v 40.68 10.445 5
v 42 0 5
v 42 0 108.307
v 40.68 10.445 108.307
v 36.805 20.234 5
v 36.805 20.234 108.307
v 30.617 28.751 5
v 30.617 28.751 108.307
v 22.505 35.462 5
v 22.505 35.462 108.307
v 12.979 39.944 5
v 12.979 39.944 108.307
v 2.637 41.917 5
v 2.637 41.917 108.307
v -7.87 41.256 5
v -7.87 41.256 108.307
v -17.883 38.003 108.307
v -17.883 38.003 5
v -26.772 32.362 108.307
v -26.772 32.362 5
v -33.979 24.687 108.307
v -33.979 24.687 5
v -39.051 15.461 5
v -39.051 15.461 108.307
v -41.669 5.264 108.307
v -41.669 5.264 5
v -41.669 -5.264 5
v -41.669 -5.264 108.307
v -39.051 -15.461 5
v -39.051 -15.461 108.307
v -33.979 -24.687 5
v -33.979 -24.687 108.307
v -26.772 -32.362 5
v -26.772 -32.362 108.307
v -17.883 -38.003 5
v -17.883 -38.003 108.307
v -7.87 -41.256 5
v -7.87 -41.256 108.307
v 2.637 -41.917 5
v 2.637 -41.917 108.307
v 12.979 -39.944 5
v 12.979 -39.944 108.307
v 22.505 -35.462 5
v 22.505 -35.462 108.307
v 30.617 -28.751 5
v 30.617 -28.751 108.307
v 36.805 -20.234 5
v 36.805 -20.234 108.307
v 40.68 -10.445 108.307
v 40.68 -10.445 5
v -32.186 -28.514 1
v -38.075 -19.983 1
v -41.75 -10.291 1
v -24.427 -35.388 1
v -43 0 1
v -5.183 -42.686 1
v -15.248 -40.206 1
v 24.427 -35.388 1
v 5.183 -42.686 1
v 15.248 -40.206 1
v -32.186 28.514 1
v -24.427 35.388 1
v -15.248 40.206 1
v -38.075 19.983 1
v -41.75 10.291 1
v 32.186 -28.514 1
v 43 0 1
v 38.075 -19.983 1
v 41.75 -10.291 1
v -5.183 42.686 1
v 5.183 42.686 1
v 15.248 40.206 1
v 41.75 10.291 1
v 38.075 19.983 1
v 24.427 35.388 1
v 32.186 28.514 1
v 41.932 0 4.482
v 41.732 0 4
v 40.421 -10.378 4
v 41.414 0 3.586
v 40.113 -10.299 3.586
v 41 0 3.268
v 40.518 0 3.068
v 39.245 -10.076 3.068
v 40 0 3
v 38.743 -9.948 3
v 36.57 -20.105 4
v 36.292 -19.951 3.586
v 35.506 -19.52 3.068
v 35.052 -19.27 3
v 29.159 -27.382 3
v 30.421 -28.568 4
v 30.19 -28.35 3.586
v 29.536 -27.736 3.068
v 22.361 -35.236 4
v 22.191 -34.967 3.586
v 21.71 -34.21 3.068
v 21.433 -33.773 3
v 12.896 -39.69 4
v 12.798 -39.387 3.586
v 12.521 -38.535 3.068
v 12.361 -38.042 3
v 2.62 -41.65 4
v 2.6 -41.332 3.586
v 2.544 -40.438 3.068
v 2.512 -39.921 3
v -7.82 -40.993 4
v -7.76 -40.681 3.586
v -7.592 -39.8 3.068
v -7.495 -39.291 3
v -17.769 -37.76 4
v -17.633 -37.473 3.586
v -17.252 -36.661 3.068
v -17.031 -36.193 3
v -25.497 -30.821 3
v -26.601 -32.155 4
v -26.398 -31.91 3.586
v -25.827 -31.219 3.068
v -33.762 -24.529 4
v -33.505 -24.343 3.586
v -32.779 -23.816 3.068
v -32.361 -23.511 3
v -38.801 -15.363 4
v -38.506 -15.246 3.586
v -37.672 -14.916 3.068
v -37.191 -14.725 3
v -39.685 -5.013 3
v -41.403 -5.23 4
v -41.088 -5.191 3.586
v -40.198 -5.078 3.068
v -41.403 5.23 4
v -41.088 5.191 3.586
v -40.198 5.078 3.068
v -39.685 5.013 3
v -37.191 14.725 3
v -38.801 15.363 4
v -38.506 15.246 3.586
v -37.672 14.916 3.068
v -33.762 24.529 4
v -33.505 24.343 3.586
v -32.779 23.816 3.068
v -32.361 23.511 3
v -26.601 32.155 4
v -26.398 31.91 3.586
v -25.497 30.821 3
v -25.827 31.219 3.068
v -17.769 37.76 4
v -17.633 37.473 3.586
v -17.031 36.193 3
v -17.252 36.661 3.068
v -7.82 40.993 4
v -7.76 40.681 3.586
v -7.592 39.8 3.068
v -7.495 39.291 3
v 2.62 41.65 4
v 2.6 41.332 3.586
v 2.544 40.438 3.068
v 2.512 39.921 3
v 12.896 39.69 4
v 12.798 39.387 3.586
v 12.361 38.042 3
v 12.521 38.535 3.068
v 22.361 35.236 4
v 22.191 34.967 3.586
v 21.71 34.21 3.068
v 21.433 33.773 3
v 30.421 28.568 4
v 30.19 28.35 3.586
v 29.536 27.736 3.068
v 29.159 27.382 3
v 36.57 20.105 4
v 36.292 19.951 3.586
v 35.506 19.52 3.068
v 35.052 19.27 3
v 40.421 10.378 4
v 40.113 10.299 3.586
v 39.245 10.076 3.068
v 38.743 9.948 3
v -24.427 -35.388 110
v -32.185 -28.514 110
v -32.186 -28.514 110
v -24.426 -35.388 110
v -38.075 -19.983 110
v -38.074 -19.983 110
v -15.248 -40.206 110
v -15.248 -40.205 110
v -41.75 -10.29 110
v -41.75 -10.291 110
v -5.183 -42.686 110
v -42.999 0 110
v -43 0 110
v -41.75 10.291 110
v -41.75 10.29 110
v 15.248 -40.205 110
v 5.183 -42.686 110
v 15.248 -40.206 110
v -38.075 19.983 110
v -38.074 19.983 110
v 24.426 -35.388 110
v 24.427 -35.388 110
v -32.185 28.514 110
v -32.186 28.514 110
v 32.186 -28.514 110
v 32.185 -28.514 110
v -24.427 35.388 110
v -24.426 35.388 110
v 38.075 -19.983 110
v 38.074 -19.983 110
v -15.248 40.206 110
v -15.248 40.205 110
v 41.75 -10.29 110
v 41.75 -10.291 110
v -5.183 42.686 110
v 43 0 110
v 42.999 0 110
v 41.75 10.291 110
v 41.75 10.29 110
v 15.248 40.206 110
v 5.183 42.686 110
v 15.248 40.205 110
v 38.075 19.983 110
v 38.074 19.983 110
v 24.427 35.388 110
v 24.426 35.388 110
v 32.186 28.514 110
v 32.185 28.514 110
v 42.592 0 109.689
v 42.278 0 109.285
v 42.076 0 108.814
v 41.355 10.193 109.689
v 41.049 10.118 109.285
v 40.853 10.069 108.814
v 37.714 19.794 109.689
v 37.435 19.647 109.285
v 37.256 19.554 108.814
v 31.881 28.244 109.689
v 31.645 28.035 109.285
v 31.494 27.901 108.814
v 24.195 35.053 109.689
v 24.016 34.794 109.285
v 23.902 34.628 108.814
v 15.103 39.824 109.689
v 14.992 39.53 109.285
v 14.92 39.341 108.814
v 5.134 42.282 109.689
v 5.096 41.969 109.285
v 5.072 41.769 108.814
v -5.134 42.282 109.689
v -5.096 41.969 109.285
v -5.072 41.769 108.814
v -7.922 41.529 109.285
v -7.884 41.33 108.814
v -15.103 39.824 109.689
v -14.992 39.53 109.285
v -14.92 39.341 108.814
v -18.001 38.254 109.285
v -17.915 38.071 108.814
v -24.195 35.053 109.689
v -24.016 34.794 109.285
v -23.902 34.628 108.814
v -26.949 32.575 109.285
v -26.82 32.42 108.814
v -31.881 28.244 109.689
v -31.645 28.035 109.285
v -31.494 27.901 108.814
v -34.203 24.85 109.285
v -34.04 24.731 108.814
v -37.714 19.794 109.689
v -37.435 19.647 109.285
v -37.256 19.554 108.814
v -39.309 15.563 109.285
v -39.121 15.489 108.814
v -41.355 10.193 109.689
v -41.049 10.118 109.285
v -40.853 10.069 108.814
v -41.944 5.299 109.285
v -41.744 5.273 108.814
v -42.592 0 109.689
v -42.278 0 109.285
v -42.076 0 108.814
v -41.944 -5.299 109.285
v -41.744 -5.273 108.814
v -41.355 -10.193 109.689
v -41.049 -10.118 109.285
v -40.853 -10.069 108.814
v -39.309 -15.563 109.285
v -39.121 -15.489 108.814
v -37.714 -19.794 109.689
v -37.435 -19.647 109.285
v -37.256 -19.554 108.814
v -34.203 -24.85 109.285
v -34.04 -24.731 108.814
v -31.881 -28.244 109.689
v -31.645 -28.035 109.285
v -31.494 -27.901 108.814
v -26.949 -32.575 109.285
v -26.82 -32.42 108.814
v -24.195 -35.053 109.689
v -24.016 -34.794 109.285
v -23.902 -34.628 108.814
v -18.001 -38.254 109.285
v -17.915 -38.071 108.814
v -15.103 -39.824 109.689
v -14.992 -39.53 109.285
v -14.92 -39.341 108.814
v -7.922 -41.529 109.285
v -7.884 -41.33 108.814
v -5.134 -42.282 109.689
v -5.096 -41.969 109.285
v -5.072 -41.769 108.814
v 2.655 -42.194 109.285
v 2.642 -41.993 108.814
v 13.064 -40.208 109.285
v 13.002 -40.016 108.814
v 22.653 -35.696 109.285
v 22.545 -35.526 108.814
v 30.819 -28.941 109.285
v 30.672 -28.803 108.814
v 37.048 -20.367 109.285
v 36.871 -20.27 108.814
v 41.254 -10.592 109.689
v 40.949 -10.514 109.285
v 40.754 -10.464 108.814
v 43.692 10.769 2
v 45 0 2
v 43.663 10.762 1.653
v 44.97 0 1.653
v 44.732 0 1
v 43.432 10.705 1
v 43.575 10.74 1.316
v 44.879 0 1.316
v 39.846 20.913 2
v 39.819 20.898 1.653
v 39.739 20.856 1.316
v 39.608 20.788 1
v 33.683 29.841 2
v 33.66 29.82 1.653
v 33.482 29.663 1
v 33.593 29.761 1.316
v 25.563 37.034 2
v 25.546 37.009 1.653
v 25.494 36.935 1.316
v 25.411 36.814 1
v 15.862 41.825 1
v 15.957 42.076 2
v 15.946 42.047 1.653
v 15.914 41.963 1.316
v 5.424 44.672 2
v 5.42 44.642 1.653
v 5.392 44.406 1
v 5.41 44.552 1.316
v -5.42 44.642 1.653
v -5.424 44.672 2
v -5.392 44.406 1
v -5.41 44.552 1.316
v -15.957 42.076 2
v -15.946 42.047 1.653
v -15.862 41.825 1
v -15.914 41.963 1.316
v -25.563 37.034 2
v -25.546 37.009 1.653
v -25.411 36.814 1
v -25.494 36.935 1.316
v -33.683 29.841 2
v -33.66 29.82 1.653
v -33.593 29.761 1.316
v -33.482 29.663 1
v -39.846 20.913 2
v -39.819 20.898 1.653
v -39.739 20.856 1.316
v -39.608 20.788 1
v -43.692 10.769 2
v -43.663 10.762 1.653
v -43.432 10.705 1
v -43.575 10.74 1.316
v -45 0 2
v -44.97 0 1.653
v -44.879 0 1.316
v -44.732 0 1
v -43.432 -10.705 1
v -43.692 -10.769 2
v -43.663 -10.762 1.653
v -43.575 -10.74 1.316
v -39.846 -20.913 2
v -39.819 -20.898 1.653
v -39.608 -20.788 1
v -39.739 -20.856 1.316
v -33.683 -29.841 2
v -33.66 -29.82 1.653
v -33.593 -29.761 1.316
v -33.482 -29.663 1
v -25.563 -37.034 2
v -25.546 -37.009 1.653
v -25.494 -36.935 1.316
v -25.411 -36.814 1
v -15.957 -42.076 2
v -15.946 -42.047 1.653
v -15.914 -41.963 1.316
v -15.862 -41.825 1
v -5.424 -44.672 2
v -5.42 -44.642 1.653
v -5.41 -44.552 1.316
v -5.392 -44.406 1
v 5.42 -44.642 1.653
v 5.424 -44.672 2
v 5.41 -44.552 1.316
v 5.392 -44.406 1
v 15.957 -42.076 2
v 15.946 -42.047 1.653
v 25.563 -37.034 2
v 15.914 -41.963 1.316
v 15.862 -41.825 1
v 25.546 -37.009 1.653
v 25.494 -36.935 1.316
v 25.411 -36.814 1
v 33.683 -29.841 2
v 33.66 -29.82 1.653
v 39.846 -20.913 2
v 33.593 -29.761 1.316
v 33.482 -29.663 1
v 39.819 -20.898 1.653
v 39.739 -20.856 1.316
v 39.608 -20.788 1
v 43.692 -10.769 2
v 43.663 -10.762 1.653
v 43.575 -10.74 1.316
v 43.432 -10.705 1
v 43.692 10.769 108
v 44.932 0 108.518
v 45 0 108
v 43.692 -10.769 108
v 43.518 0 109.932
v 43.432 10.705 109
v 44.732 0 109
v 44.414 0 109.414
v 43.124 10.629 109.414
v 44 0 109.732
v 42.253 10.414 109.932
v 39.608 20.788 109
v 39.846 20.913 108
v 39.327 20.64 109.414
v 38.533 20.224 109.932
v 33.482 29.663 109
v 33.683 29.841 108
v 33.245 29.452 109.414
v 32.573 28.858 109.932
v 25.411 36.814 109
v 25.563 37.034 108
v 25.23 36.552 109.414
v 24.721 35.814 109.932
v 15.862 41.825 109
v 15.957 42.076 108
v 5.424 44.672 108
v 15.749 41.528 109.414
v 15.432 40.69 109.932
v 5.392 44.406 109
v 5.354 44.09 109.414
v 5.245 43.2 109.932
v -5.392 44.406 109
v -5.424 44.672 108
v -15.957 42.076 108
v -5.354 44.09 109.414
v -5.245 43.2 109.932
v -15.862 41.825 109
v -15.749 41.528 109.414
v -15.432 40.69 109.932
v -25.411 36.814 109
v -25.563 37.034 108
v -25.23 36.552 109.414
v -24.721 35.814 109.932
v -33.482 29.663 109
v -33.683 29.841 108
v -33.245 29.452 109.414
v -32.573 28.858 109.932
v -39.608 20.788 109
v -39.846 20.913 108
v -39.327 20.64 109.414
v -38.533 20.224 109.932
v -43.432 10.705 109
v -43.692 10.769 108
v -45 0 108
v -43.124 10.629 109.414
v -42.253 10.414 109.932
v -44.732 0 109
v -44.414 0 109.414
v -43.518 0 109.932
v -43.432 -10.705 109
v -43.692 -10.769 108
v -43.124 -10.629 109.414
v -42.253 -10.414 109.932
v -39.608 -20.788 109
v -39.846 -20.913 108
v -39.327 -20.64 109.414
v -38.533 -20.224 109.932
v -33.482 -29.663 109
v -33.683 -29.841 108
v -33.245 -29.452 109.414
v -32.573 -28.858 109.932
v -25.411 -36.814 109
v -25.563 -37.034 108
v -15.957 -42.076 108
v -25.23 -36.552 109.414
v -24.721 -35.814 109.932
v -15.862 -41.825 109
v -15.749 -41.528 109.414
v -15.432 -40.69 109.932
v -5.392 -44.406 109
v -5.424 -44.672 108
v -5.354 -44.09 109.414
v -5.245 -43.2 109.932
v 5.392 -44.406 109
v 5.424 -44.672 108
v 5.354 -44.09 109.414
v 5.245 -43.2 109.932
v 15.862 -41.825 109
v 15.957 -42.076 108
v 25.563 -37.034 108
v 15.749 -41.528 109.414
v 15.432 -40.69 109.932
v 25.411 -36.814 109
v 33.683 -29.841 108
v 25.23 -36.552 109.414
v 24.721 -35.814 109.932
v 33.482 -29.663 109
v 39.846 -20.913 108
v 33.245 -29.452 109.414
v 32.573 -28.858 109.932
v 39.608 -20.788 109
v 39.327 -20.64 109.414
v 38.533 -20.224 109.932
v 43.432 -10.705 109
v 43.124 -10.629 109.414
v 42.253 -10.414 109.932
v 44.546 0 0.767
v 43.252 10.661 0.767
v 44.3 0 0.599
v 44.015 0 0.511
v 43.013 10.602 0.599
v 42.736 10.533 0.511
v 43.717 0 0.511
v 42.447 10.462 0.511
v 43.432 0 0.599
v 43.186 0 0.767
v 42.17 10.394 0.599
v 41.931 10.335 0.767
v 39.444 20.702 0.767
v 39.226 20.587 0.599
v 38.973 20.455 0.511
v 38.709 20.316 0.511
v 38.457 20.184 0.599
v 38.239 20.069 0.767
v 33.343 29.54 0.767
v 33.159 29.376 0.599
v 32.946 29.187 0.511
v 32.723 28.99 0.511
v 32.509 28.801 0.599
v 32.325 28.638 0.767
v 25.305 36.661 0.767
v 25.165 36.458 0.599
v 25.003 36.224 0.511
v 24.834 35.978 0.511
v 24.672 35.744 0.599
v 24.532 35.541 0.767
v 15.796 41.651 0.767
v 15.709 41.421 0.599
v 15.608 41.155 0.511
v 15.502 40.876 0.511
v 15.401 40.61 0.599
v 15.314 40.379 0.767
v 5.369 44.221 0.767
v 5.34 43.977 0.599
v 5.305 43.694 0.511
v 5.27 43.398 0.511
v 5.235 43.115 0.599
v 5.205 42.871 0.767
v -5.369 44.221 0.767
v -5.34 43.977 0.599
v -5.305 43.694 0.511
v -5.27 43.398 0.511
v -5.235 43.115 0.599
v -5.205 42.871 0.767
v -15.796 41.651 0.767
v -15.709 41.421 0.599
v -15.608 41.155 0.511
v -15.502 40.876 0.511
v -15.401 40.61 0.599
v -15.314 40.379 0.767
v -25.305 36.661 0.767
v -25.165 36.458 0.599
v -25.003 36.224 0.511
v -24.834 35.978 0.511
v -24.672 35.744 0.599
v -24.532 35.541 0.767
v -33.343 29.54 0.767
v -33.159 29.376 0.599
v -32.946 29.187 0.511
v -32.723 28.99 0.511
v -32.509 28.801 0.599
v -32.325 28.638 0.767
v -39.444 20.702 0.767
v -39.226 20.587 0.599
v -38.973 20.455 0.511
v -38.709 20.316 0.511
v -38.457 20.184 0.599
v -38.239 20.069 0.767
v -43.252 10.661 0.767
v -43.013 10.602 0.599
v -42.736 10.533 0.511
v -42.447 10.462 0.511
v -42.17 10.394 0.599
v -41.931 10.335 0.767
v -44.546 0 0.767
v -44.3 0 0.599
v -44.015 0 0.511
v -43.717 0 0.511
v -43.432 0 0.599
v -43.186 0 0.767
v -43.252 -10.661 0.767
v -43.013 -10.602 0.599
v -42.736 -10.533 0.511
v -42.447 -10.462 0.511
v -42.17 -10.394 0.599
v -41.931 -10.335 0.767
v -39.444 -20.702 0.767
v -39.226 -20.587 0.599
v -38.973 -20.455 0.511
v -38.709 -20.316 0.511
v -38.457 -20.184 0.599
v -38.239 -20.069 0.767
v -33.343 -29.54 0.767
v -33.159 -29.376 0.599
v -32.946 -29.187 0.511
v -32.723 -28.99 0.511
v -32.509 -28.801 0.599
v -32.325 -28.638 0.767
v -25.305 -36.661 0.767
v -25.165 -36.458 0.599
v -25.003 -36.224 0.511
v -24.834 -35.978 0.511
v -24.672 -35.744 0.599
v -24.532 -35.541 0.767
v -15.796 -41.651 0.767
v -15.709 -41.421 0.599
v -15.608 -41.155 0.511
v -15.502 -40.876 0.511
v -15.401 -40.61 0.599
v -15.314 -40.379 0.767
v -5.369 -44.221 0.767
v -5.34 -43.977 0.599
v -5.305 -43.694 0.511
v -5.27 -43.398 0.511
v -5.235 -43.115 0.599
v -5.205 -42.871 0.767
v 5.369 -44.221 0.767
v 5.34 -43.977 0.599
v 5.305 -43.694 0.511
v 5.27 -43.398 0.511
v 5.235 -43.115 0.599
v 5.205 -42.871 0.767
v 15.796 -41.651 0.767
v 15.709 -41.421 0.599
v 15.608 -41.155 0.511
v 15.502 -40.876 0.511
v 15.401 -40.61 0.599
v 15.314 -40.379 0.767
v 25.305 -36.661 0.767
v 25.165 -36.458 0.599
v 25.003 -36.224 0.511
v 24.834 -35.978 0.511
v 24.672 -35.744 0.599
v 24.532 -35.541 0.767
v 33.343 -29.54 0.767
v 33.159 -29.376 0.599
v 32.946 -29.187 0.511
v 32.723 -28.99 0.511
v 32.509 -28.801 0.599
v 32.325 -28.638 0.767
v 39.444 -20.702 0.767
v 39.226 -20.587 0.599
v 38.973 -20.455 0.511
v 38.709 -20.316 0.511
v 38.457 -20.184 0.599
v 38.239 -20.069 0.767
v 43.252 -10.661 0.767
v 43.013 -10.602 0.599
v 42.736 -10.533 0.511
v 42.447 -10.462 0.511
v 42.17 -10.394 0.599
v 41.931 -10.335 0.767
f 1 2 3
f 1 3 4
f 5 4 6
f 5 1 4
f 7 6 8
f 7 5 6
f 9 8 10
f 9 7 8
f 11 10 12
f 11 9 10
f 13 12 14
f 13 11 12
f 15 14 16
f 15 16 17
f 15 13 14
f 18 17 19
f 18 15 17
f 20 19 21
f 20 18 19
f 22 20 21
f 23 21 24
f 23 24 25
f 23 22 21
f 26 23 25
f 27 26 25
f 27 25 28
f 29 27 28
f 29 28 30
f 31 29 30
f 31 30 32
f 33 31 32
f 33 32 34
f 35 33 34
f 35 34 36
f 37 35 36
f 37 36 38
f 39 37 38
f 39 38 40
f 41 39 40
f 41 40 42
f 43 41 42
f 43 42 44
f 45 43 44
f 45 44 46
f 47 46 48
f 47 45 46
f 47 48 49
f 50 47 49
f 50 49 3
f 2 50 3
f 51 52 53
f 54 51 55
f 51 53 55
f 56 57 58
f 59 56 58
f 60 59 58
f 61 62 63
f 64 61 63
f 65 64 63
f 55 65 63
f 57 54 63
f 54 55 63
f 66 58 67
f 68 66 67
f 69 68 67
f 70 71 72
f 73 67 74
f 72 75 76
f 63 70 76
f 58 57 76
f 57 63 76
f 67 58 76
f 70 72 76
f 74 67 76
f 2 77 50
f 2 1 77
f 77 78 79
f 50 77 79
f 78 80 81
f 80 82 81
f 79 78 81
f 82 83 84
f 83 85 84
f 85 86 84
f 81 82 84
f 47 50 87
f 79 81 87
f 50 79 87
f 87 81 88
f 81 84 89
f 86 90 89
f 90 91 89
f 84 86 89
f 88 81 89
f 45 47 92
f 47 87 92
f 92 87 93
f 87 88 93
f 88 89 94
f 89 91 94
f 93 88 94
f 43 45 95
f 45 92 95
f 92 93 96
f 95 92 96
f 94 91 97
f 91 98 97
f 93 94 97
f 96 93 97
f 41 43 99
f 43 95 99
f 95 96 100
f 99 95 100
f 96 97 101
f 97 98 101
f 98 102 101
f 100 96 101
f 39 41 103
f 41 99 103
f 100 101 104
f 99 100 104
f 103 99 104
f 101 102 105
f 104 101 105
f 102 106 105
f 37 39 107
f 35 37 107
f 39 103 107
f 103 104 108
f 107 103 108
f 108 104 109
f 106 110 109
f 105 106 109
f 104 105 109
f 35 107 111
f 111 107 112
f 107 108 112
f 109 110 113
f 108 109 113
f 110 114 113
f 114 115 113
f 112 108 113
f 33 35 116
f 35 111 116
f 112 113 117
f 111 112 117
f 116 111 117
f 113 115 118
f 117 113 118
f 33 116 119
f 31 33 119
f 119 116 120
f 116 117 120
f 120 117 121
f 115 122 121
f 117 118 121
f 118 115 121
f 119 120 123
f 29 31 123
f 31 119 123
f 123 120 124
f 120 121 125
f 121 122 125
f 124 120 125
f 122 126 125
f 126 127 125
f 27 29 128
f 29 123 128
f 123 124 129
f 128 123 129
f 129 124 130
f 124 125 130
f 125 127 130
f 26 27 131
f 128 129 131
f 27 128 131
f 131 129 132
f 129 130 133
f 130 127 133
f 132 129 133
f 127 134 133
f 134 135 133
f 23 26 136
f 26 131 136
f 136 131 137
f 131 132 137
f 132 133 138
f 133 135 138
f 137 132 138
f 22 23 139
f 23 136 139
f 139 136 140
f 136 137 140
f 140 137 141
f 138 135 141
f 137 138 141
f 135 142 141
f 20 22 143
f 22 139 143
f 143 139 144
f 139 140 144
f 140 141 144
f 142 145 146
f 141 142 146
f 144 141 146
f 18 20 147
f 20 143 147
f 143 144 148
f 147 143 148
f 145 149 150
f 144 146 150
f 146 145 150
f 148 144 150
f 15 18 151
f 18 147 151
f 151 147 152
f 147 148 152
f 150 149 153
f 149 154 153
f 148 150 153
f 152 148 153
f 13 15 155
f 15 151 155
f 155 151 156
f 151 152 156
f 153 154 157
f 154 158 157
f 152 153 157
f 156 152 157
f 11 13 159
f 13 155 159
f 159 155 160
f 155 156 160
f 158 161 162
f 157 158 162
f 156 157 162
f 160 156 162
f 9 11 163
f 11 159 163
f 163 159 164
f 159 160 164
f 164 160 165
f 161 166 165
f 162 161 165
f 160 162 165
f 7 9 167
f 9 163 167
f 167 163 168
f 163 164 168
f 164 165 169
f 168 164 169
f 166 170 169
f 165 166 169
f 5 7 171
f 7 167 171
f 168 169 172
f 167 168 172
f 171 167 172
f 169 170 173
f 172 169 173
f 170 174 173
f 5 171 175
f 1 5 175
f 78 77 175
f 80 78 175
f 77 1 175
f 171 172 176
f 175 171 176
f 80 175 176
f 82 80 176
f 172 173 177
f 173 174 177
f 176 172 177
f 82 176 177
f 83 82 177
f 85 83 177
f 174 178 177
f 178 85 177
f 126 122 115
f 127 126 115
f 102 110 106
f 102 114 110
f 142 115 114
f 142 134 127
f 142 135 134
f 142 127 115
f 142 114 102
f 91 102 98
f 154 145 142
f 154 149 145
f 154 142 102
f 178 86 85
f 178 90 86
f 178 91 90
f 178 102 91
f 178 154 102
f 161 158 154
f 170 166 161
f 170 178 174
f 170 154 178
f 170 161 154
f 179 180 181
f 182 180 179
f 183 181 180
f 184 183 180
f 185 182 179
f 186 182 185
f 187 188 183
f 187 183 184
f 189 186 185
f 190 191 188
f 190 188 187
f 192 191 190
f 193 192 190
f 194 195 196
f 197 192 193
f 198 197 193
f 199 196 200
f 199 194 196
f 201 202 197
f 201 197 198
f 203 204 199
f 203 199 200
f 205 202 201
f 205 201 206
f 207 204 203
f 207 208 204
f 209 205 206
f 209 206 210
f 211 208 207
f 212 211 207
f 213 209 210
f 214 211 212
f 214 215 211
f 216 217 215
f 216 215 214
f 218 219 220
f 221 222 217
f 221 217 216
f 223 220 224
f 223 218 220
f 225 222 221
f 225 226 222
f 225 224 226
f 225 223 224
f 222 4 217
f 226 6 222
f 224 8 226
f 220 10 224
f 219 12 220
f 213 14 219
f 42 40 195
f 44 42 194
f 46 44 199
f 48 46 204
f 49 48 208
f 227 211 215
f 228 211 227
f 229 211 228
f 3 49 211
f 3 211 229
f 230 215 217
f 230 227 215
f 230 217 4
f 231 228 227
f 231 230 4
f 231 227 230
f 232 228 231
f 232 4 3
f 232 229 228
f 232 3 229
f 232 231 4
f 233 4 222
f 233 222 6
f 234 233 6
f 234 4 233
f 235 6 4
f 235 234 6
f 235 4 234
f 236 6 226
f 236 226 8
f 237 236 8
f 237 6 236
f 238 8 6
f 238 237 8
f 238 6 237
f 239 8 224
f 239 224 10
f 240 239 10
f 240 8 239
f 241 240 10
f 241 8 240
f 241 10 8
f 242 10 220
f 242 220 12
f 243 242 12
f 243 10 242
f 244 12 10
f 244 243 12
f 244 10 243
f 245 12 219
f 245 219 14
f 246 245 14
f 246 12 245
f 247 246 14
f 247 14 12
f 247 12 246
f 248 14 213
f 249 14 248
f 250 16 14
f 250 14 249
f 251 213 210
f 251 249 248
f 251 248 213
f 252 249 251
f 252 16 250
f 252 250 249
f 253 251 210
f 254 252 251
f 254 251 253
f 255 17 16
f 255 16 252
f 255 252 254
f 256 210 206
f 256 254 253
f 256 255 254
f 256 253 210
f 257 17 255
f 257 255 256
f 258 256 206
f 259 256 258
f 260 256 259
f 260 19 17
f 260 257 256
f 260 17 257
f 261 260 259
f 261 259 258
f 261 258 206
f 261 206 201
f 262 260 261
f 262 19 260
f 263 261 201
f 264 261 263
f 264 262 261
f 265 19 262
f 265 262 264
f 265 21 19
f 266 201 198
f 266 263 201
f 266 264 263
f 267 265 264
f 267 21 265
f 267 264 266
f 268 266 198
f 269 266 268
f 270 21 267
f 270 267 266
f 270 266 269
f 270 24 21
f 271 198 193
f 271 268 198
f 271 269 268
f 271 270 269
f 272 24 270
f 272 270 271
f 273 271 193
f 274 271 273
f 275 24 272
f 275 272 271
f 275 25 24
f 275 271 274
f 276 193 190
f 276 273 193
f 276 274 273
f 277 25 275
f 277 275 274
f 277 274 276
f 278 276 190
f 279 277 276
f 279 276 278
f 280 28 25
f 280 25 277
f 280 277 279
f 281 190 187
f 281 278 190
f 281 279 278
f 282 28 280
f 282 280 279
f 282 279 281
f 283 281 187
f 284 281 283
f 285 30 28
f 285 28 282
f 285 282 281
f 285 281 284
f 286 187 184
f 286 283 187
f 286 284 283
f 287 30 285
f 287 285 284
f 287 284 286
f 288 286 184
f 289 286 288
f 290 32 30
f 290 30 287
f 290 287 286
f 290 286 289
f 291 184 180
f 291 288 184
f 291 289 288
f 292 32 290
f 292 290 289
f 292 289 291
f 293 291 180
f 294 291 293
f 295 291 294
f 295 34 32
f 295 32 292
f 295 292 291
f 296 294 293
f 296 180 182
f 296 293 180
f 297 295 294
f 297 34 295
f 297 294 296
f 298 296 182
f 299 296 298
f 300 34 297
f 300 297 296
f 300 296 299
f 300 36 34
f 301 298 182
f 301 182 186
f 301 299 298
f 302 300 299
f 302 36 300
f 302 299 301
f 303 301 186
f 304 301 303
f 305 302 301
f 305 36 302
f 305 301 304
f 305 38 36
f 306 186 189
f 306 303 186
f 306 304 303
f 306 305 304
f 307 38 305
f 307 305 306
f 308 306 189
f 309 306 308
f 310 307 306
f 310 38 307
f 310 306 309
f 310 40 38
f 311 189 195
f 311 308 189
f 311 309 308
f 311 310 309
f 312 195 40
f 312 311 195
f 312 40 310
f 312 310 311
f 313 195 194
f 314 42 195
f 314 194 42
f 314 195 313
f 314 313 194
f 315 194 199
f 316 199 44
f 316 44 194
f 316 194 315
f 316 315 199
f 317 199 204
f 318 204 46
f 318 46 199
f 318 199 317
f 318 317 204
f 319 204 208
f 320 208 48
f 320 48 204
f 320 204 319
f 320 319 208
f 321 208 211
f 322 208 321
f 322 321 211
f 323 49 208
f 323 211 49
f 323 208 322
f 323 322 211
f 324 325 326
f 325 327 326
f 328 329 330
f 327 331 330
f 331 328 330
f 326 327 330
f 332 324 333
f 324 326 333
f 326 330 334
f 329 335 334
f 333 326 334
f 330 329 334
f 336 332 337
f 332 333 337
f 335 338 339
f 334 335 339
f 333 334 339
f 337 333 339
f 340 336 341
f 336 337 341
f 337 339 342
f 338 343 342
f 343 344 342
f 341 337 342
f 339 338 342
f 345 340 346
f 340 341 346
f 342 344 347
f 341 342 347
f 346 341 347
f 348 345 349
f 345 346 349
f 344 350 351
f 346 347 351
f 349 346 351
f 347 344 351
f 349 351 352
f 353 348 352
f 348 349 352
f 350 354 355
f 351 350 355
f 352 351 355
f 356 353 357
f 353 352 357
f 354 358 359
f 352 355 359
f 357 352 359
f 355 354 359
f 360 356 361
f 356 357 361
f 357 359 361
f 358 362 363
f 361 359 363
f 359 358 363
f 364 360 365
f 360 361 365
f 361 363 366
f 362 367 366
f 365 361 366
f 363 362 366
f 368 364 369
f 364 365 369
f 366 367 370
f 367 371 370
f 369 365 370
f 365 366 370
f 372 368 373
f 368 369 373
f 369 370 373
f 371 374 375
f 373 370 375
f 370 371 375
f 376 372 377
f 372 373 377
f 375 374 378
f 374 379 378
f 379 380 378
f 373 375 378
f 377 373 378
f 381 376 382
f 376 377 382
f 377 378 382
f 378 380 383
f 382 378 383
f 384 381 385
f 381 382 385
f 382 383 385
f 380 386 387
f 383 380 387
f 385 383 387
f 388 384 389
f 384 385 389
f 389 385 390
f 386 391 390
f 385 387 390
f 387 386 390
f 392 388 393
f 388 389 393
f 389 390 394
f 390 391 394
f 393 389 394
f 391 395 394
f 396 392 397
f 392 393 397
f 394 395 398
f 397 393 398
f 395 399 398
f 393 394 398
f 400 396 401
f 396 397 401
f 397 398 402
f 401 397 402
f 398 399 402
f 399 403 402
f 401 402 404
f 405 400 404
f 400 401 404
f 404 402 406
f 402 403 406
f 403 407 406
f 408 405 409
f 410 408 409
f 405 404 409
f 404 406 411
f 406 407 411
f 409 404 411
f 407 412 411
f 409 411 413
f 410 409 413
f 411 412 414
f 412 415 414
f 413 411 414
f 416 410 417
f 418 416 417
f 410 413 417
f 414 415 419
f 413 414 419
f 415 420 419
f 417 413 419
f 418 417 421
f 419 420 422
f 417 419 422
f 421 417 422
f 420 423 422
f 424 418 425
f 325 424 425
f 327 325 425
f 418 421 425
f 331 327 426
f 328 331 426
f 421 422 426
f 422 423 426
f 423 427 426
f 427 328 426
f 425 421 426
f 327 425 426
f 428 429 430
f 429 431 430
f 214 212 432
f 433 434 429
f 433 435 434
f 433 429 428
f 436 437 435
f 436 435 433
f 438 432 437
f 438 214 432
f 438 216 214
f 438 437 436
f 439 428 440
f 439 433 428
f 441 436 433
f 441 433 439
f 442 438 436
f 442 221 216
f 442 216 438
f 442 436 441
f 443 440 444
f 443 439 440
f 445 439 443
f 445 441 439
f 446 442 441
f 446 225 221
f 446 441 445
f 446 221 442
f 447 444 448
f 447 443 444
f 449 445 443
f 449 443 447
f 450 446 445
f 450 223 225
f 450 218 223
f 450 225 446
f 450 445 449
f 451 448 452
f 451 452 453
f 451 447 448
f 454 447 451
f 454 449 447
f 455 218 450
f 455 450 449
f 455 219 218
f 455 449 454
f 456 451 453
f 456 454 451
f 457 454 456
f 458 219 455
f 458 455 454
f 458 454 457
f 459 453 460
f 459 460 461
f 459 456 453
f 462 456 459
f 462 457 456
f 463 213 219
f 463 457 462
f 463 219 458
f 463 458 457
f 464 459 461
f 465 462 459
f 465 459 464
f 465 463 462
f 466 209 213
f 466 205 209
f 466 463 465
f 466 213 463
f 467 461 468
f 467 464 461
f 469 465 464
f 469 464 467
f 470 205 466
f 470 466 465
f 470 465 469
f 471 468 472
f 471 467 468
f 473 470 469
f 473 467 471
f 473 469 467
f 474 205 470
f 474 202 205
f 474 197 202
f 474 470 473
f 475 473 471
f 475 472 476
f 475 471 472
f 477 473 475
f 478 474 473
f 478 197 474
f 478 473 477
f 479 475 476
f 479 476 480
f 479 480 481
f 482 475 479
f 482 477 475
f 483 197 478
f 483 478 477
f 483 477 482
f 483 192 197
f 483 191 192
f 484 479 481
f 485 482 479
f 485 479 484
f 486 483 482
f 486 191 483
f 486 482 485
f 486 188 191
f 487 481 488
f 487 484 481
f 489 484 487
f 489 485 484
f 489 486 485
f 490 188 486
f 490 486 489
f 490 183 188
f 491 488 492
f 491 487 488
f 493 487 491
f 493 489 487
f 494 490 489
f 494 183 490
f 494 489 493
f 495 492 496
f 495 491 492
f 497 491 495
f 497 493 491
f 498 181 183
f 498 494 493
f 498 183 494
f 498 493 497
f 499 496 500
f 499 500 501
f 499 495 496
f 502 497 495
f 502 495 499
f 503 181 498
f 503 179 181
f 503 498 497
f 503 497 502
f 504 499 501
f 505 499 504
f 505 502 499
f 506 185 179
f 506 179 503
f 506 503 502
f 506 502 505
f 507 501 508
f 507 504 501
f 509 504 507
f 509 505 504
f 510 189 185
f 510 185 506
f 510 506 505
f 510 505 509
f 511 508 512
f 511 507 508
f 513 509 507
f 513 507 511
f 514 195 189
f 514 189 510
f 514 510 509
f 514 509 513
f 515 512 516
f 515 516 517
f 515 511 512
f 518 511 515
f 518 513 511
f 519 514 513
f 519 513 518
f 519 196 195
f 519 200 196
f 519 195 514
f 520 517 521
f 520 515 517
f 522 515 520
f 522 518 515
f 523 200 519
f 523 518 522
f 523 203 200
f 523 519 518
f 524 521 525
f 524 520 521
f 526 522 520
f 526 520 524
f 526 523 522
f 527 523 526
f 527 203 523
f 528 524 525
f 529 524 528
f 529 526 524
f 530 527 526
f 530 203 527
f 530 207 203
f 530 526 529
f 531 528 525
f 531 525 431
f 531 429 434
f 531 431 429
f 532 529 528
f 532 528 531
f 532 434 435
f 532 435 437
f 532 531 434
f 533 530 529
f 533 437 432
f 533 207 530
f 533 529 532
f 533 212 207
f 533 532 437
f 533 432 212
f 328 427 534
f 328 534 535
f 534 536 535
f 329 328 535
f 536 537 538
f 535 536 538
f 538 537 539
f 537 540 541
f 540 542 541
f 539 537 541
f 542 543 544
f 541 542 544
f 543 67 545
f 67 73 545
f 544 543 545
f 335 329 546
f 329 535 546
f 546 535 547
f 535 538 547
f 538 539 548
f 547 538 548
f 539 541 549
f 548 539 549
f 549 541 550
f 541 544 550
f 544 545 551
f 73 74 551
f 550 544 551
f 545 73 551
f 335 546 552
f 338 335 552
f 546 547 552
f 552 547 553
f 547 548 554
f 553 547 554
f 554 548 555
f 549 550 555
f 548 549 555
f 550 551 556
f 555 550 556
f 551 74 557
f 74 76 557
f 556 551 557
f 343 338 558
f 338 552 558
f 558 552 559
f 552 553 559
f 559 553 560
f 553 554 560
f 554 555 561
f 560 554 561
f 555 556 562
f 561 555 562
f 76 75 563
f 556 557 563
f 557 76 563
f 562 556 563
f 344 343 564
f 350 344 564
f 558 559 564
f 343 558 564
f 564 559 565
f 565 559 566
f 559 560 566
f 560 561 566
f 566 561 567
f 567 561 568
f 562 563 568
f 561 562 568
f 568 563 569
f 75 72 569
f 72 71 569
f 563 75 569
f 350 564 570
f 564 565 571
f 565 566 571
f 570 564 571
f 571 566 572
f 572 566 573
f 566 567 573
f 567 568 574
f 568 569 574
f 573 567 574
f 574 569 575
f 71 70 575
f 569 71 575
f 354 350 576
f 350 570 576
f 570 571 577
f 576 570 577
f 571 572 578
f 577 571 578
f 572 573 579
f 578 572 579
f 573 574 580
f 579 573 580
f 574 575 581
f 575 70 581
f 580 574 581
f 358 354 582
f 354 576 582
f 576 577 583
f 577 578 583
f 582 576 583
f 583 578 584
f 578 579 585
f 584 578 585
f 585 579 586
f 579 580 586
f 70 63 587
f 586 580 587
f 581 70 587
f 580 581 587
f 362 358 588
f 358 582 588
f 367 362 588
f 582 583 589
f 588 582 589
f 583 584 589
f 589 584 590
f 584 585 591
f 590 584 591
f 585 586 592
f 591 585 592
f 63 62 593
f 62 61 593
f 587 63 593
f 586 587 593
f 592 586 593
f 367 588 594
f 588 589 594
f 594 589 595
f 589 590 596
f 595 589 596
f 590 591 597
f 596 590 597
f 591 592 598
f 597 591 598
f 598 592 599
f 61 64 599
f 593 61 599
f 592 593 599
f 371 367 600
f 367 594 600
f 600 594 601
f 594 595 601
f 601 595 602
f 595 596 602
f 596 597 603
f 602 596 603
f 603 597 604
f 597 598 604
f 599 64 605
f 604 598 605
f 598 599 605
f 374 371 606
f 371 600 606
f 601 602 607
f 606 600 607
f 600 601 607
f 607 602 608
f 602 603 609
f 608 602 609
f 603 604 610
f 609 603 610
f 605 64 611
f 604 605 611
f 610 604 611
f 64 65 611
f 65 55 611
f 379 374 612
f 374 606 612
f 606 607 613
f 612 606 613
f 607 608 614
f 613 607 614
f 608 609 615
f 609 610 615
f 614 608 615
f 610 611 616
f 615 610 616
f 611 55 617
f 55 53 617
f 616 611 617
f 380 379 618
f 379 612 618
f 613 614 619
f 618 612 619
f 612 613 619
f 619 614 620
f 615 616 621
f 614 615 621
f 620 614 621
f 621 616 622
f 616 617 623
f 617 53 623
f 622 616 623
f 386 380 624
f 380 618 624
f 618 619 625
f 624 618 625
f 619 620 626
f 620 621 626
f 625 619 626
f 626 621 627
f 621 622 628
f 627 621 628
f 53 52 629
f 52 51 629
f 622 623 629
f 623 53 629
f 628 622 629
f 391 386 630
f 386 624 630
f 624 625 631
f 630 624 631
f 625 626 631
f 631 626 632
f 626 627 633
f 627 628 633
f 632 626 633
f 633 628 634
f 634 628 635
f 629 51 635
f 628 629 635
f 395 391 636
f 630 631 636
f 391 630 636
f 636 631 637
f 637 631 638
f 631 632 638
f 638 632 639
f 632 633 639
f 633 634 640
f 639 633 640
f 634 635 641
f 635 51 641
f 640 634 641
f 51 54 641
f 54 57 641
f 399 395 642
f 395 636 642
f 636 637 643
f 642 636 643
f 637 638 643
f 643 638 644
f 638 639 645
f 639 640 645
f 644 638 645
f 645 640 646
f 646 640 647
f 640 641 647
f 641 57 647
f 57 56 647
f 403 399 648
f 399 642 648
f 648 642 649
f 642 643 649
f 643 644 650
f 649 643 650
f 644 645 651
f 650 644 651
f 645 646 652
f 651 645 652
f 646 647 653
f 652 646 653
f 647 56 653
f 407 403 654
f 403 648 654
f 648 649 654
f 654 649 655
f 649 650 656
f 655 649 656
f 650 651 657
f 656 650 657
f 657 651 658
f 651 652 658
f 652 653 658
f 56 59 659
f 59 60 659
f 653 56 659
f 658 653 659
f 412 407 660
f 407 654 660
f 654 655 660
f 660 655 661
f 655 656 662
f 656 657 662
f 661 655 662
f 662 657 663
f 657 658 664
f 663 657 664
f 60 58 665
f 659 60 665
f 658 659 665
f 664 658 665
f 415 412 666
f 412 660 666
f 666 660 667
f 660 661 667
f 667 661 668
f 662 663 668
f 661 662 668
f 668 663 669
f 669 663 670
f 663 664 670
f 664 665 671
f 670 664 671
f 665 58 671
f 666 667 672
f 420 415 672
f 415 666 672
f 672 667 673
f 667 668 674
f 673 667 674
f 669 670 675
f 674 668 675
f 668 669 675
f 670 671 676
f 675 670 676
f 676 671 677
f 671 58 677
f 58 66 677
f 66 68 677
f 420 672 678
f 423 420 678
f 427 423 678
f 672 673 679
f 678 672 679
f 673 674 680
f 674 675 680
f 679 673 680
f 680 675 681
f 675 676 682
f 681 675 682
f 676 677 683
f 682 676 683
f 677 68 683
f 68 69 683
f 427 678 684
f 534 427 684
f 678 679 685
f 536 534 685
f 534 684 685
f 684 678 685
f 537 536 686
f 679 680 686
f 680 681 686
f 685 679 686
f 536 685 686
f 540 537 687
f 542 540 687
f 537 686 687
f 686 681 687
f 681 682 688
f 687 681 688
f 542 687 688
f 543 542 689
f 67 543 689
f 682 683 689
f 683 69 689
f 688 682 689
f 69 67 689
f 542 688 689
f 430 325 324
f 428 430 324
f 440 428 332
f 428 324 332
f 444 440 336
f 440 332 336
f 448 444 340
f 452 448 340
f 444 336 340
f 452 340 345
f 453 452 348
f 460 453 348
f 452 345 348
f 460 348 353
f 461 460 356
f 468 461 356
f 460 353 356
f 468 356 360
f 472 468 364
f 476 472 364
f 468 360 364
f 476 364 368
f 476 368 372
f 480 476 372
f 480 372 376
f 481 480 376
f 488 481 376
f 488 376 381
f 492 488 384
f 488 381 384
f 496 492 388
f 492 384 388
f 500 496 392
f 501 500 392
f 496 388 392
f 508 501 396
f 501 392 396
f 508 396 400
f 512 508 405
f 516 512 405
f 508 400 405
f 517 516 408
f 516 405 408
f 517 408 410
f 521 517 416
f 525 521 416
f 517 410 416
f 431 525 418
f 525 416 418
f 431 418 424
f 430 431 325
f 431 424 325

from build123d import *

# Parameters (mm, degrees)
F0_R     = 45
F1_DEPTH = 110
F2_T     = -3
F3_R     = 2
F4_R     = 2
F5_R     = 2
F7_DEPTH = 1


# Not quite as in the source:
# - a fillet or chamfer that OpenCascade refuses, or shapes differently, is made with other operations: its cross-section is extruded or revolved along the edge and cut away or added


with BuildPart() as f1:
    # F0 (on Top) → F1 (new body)
    with BuildSketch(Plane.XY):
        Circle(F0_R)
    extrude(amount=F1_DEPTH)

    # F2
    f2_openings = [f1.faces().sort_by_distance(p)[0] for p in [
        (0, 0, 110),
    ]]
    offset(amount=F2_T, openings=f2_openings)

    # F3
    f3_edges = [f1.edges().sort_by_distance(p)[0] for p in [
        (-42, 0, 3),
    ]]
    fillet(f3_edges, radius=F3_R)

    # F4
    f4_edges = [f1.edges().sort_by_distance(p)[0] for p in [
        (-45, 0, 0),
    ]]
    fillet(f4_edges, radius=F4_R)

    # F5
    f5_edges = [f1.edges().sort_by_distance(p)[0] for p in [
        (-45, 0, 110),
    ]]
    fillet(f5_edges, radius=F5_R)

    # F6: fillet of radius 2 on 1 edges, made by hand

    # F6_s1 → F6_t2 (revolve, cut)
    with BuildSketch(Plane.XZ):
        with BuildLine():
            ThreePointArc((42.9997999035, 110.0003463544), (42.2675927526, 109.2678330874), (41.9996, 108.2673917434))
            Line((41.9996, 108.2673917434), (41.7994634315, 108.2673917434))
            ThreePointArc((41.7994634315, 108.2673917434), (41.7998634315, 109.1336958717), (41.7998634315, 110))
            Line((41.7998634315, 110), (42, 110.2001365685))
            ThreePointArc((42, 110.2001365685), (42.4998999517, 110.2001365685), (42.8996833253, 110.1736418155))
            Line((42.8996833253, 110.1736418155), (42.9997999035, 110.0003463544))
        make_face()
    revolve(axis=Axis((0, 0, 110), (0, 0, 1)), mode=Mode.SUBTRACT)

    # F7 (cut): a face of the model
    f7_faces = [f1.faces().sort_by_distance(p)[0] for p in [
        (0, 0, 0),
    ]]
    extrude(f7_faces, amount=-F7_DEPTH, mode=Mode.SUBTRACT)

    # F8: fillet of radius 1 on 1 edges, made by hand

    # F8_s1 → F8_t2 (revolve, cut)
    with BuildSketch(Plane.XZ):
        with BuildLine():
            ThreePointArc((44.7320508076, 1), (43.8660254038, 0.5), (43, 1))
            Line((43, 1), (43, 0))
            ThreePointArc((43, 0), (44, 0.2679491924), (44.7320508076, 1))
        make_face()
    revolve(axis=Axis((0, 0, 0), (0, 0, 1)), mode=Mode.SUBTRACT)


solid = f1.part
